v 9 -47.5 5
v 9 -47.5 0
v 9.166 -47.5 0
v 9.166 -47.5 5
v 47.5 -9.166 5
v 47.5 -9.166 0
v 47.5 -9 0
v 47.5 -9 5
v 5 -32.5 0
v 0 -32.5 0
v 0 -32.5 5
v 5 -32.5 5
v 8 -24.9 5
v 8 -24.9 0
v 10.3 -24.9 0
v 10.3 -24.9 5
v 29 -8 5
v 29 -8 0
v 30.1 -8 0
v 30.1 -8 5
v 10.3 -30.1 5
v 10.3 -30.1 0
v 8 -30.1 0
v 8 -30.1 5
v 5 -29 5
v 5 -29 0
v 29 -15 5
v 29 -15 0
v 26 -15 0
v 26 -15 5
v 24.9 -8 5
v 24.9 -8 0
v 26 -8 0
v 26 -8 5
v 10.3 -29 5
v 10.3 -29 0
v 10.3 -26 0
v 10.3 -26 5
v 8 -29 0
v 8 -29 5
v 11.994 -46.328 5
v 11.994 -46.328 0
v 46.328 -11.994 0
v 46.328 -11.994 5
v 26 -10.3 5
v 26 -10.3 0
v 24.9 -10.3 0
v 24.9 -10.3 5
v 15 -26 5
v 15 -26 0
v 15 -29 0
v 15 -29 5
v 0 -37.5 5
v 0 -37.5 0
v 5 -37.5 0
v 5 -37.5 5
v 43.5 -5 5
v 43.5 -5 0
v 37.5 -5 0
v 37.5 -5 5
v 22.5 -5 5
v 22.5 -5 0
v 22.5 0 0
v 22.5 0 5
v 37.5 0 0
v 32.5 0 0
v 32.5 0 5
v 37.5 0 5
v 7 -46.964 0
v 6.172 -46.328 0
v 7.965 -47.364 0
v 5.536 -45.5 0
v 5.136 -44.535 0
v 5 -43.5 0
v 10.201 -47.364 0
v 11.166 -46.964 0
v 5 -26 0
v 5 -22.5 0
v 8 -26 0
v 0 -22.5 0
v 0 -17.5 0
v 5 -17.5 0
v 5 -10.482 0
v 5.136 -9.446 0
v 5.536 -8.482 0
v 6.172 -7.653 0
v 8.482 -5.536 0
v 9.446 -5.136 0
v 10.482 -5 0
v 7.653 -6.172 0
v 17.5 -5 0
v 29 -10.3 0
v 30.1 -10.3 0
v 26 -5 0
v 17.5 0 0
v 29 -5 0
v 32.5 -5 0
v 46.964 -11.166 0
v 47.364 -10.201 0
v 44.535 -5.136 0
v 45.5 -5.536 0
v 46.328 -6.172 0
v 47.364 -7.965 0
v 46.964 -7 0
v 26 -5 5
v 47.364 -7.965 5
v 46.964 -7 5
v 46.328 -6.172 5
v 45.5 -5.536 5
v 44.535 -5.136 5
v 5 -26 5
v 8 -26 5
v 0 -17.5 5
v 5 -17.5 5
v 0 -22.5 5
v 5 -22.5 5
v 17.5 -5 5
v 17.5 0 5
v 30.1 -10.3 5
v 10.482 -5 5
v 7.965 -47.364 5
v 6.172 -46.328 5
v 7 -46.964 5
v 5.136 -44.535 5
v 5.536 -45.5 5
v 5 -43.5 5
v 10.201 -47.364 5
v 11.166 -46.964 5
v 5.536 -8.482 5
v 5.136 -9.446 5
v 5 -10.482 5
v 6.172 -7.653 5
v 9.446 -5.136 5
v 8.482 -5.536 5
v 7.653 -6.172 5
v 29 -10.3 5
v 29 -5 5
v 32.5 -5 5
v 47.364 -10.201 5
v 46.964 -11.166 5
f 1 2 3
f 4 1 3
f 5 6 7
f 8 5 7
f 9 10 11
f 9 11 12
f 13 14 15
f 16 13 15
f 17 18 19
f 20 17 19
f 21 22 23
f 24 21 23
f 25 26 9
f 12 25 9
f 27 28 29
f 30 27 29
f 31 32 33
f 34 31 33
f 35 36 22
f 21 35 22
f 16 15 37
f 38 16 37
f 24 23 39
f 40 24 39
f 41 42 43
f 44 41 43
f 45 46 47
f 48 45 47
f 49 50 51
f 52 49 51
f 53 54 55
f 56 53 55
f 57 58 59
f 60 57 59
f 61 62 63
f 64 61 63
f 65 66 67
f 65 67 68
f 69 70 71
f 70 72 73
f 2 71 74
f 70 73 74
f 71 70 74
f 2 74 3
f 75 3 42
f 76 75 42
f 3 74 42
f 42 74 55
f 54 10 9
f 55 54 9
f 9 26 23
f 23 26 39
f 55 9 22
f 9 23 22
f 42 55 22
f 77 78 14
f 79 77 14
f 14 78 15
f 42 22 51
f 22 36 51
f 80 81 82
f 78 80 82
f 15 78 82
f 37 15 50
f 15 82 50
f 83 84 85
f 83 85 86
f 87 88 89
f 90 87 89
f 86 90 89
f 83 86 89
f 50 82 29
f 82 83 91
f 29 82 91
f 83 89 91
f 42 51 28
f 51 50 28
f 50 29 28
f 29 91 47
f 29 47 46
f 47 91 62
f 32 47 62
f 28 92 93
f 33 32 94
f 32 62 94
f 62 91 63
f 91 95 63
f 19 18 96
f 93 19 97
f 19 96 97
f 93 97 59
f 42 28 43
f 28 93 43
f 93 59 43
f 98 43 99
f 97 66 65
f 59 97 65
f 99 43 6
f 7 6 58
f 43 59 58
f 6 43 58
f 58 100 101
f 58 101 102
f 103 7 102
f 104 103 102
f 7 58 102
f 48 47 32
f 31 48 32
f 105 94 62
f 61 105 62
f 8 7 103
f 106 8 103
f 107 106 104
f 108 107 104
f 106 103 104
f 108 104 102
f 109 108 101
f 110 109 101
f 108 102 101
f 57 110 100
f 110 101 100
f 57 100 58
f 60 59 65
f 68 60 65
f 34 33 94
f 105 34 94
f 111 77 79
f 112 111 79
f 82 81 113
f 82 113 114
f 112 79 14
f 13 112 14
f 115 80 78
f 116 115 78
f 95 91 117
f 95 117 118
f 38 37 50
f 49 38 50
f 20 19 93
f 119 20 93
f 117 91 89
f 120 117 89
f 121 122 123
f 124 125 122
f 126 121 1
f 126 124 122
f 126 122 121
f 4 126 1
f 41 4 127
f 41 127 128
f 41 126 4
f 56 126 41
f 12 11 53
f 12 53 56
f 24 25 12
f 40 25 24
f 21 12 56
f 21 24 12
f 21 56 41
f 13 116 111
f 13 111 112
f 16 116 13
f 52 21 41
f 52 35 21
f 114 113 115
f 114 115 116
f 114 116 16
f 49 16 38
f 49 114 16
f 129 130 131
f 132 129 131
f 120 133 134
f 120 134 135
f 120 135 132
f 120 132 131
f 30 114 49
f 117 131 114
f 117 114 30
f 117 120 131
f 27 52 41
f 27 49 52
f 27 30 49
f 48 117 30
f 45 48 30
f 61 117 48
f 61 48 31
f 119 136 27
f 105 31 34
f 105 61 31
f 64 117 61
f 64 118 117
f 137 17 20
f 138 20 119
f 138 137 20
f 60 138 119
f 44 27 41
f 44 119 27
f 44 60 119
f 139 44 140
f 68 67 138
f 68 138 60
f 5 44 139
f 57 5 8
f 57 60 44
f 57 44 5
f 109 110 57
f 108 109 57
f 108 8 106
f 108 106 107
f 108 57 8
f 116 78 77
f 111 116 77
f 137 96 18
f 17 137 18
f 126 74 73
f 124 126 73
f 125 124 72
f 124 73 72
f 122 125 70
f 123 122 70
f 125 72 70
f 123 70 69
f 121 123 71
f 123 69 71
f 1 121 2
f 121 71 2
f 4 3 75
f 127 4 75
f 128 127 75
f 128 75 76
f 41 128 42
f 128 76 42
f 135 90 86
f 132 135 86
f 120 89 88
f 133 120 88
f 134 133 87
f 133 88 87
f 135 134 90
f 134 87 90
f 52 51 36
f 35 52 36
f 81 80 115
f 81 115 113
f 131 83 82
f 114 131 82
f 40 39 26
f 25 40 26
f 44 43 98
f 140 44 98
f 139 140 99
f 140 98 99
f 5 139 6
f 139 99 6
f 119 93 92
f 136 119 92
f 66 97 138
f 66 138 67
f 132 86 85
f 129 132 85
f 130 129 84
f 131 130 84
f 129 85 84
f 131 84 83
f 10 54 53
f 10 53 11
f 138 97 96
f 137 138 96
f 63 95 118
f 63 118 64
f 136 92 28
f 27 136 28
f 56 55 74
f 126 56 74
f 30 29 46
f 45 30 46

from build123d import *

# Parameters (mm, degrees)
SKETCH1_W           = 5
SKETCH1_H           = 5
BOSS_EXTRUDE1_DEPTH = 5


with BuildPart() as part:
    # Sketch1 → Boss-Extrude1 (new body)
    with BuildSketch(Plane.XY):
        with BuildLine():
            Line((17.5, -5), (10.481741735, -5))
            ThreePointArc((10.481741735, -5), (8.951008006, -5.30448187), (7.653314611, -6.171572875))
            Line((7.653314611, -6.171572875), (6.171572875, -7.653314611))
            ThreePointArc((6.171572875, -7.653314611), (5.30448187, -8.951008006), (5, -10.481741735))
            Line((5, -10.481741735), (5, -17.5))
            Line((5, -17.5), (5, -22.5))
            Line((5, -22.5), (5, -26))
            Line((5, -26), (8, -26))
            Line((8, -26), (8, -24.9))
            Line((8, -24.9), (10.3, -24.9))
            Line((10.3, -24.9), (10.3, -26))
            Line((10.3, -26), (15, -26))
            Line((15, -26), (15, -29))
            Line((15, -29), (10.3, -29))
            Line((10.3, -29), (10.3, -30.1))
            Line((10.3, -30.1), (8, -30.1))
            Line((8, -30.1), (8, -29))
            Line((8, -29), (5, -29))
            Line((5, -29), (5, -32.5))
            Line((5, -32.5), (5, -37.5))
            Line((5, -37.5), (5, -43.5))
            ThreePointArc((5, -43.5), (6.171572875, -46.328427125), (9, -47.5))
            Line((9, -47.5), (9.165507919, -47.5))
            ThreePointArc((9.165507919, -47.5), (10.696241649, -47.19551813), (11.993935044, -46.328427125))
            Line((11.993935044, -46.328427125), (46.328427125, -11.993935044))
            ThreePointArc((46.328427125, -11.993935044), (47.19551813, -10.696241649), (47.5, -9.165507919))
            Line((47.5, -9.165507919), (47.5, -9))
            ThreePointArc((47.5, -9), (46.328427125, -6.171572875), (43.5, -5))
            Line((43.5, -5), (37.5, -5))
            Line((37.5, -5), (32.5, -5))
            Line((32.5, -5), (29, -5))
            Line((29, -5), (29, -8))
            Line((29, -8), (30.1, -8))
            Line((30.1, -8), (30.1, -10.3))
            Line((30.1, -10.3), (29, -10.3))
            Line((29, -10.3), (29, -15))
            Line((29, -15), (26, -15))
            Line((26, -15), (26, -10.3))
            Line((26, -10.3), (24.9, -10.3))
            Line((24.9, -10.3), (24.9, -8))
            Line((24.9, -8), (26, -8))
            Line((26, -8), (26, -5))
            Line((26, -5), (22.5, -5))
            Line((22.5, -5), (17.5, -5))
        make_face()
        with Locations((2.5, -20)):
            Rectangle(SKETCH1_W, SKETCH1_H)
        with Locations((20, -2.5)):
            Rectangle(SKETCH1_W, SKETCH1_H)
        with Locations((35, -2.5)):
            Rectangle(SKETCH1_W, SKETCH1_H)
        with Locations((2.5, -35)):
            Rectangle(SKETCH1_W, SKETCH1_H)
    extrude(amount=BOSS_EXTRUDE1_DEPTH)


solid = part.part
